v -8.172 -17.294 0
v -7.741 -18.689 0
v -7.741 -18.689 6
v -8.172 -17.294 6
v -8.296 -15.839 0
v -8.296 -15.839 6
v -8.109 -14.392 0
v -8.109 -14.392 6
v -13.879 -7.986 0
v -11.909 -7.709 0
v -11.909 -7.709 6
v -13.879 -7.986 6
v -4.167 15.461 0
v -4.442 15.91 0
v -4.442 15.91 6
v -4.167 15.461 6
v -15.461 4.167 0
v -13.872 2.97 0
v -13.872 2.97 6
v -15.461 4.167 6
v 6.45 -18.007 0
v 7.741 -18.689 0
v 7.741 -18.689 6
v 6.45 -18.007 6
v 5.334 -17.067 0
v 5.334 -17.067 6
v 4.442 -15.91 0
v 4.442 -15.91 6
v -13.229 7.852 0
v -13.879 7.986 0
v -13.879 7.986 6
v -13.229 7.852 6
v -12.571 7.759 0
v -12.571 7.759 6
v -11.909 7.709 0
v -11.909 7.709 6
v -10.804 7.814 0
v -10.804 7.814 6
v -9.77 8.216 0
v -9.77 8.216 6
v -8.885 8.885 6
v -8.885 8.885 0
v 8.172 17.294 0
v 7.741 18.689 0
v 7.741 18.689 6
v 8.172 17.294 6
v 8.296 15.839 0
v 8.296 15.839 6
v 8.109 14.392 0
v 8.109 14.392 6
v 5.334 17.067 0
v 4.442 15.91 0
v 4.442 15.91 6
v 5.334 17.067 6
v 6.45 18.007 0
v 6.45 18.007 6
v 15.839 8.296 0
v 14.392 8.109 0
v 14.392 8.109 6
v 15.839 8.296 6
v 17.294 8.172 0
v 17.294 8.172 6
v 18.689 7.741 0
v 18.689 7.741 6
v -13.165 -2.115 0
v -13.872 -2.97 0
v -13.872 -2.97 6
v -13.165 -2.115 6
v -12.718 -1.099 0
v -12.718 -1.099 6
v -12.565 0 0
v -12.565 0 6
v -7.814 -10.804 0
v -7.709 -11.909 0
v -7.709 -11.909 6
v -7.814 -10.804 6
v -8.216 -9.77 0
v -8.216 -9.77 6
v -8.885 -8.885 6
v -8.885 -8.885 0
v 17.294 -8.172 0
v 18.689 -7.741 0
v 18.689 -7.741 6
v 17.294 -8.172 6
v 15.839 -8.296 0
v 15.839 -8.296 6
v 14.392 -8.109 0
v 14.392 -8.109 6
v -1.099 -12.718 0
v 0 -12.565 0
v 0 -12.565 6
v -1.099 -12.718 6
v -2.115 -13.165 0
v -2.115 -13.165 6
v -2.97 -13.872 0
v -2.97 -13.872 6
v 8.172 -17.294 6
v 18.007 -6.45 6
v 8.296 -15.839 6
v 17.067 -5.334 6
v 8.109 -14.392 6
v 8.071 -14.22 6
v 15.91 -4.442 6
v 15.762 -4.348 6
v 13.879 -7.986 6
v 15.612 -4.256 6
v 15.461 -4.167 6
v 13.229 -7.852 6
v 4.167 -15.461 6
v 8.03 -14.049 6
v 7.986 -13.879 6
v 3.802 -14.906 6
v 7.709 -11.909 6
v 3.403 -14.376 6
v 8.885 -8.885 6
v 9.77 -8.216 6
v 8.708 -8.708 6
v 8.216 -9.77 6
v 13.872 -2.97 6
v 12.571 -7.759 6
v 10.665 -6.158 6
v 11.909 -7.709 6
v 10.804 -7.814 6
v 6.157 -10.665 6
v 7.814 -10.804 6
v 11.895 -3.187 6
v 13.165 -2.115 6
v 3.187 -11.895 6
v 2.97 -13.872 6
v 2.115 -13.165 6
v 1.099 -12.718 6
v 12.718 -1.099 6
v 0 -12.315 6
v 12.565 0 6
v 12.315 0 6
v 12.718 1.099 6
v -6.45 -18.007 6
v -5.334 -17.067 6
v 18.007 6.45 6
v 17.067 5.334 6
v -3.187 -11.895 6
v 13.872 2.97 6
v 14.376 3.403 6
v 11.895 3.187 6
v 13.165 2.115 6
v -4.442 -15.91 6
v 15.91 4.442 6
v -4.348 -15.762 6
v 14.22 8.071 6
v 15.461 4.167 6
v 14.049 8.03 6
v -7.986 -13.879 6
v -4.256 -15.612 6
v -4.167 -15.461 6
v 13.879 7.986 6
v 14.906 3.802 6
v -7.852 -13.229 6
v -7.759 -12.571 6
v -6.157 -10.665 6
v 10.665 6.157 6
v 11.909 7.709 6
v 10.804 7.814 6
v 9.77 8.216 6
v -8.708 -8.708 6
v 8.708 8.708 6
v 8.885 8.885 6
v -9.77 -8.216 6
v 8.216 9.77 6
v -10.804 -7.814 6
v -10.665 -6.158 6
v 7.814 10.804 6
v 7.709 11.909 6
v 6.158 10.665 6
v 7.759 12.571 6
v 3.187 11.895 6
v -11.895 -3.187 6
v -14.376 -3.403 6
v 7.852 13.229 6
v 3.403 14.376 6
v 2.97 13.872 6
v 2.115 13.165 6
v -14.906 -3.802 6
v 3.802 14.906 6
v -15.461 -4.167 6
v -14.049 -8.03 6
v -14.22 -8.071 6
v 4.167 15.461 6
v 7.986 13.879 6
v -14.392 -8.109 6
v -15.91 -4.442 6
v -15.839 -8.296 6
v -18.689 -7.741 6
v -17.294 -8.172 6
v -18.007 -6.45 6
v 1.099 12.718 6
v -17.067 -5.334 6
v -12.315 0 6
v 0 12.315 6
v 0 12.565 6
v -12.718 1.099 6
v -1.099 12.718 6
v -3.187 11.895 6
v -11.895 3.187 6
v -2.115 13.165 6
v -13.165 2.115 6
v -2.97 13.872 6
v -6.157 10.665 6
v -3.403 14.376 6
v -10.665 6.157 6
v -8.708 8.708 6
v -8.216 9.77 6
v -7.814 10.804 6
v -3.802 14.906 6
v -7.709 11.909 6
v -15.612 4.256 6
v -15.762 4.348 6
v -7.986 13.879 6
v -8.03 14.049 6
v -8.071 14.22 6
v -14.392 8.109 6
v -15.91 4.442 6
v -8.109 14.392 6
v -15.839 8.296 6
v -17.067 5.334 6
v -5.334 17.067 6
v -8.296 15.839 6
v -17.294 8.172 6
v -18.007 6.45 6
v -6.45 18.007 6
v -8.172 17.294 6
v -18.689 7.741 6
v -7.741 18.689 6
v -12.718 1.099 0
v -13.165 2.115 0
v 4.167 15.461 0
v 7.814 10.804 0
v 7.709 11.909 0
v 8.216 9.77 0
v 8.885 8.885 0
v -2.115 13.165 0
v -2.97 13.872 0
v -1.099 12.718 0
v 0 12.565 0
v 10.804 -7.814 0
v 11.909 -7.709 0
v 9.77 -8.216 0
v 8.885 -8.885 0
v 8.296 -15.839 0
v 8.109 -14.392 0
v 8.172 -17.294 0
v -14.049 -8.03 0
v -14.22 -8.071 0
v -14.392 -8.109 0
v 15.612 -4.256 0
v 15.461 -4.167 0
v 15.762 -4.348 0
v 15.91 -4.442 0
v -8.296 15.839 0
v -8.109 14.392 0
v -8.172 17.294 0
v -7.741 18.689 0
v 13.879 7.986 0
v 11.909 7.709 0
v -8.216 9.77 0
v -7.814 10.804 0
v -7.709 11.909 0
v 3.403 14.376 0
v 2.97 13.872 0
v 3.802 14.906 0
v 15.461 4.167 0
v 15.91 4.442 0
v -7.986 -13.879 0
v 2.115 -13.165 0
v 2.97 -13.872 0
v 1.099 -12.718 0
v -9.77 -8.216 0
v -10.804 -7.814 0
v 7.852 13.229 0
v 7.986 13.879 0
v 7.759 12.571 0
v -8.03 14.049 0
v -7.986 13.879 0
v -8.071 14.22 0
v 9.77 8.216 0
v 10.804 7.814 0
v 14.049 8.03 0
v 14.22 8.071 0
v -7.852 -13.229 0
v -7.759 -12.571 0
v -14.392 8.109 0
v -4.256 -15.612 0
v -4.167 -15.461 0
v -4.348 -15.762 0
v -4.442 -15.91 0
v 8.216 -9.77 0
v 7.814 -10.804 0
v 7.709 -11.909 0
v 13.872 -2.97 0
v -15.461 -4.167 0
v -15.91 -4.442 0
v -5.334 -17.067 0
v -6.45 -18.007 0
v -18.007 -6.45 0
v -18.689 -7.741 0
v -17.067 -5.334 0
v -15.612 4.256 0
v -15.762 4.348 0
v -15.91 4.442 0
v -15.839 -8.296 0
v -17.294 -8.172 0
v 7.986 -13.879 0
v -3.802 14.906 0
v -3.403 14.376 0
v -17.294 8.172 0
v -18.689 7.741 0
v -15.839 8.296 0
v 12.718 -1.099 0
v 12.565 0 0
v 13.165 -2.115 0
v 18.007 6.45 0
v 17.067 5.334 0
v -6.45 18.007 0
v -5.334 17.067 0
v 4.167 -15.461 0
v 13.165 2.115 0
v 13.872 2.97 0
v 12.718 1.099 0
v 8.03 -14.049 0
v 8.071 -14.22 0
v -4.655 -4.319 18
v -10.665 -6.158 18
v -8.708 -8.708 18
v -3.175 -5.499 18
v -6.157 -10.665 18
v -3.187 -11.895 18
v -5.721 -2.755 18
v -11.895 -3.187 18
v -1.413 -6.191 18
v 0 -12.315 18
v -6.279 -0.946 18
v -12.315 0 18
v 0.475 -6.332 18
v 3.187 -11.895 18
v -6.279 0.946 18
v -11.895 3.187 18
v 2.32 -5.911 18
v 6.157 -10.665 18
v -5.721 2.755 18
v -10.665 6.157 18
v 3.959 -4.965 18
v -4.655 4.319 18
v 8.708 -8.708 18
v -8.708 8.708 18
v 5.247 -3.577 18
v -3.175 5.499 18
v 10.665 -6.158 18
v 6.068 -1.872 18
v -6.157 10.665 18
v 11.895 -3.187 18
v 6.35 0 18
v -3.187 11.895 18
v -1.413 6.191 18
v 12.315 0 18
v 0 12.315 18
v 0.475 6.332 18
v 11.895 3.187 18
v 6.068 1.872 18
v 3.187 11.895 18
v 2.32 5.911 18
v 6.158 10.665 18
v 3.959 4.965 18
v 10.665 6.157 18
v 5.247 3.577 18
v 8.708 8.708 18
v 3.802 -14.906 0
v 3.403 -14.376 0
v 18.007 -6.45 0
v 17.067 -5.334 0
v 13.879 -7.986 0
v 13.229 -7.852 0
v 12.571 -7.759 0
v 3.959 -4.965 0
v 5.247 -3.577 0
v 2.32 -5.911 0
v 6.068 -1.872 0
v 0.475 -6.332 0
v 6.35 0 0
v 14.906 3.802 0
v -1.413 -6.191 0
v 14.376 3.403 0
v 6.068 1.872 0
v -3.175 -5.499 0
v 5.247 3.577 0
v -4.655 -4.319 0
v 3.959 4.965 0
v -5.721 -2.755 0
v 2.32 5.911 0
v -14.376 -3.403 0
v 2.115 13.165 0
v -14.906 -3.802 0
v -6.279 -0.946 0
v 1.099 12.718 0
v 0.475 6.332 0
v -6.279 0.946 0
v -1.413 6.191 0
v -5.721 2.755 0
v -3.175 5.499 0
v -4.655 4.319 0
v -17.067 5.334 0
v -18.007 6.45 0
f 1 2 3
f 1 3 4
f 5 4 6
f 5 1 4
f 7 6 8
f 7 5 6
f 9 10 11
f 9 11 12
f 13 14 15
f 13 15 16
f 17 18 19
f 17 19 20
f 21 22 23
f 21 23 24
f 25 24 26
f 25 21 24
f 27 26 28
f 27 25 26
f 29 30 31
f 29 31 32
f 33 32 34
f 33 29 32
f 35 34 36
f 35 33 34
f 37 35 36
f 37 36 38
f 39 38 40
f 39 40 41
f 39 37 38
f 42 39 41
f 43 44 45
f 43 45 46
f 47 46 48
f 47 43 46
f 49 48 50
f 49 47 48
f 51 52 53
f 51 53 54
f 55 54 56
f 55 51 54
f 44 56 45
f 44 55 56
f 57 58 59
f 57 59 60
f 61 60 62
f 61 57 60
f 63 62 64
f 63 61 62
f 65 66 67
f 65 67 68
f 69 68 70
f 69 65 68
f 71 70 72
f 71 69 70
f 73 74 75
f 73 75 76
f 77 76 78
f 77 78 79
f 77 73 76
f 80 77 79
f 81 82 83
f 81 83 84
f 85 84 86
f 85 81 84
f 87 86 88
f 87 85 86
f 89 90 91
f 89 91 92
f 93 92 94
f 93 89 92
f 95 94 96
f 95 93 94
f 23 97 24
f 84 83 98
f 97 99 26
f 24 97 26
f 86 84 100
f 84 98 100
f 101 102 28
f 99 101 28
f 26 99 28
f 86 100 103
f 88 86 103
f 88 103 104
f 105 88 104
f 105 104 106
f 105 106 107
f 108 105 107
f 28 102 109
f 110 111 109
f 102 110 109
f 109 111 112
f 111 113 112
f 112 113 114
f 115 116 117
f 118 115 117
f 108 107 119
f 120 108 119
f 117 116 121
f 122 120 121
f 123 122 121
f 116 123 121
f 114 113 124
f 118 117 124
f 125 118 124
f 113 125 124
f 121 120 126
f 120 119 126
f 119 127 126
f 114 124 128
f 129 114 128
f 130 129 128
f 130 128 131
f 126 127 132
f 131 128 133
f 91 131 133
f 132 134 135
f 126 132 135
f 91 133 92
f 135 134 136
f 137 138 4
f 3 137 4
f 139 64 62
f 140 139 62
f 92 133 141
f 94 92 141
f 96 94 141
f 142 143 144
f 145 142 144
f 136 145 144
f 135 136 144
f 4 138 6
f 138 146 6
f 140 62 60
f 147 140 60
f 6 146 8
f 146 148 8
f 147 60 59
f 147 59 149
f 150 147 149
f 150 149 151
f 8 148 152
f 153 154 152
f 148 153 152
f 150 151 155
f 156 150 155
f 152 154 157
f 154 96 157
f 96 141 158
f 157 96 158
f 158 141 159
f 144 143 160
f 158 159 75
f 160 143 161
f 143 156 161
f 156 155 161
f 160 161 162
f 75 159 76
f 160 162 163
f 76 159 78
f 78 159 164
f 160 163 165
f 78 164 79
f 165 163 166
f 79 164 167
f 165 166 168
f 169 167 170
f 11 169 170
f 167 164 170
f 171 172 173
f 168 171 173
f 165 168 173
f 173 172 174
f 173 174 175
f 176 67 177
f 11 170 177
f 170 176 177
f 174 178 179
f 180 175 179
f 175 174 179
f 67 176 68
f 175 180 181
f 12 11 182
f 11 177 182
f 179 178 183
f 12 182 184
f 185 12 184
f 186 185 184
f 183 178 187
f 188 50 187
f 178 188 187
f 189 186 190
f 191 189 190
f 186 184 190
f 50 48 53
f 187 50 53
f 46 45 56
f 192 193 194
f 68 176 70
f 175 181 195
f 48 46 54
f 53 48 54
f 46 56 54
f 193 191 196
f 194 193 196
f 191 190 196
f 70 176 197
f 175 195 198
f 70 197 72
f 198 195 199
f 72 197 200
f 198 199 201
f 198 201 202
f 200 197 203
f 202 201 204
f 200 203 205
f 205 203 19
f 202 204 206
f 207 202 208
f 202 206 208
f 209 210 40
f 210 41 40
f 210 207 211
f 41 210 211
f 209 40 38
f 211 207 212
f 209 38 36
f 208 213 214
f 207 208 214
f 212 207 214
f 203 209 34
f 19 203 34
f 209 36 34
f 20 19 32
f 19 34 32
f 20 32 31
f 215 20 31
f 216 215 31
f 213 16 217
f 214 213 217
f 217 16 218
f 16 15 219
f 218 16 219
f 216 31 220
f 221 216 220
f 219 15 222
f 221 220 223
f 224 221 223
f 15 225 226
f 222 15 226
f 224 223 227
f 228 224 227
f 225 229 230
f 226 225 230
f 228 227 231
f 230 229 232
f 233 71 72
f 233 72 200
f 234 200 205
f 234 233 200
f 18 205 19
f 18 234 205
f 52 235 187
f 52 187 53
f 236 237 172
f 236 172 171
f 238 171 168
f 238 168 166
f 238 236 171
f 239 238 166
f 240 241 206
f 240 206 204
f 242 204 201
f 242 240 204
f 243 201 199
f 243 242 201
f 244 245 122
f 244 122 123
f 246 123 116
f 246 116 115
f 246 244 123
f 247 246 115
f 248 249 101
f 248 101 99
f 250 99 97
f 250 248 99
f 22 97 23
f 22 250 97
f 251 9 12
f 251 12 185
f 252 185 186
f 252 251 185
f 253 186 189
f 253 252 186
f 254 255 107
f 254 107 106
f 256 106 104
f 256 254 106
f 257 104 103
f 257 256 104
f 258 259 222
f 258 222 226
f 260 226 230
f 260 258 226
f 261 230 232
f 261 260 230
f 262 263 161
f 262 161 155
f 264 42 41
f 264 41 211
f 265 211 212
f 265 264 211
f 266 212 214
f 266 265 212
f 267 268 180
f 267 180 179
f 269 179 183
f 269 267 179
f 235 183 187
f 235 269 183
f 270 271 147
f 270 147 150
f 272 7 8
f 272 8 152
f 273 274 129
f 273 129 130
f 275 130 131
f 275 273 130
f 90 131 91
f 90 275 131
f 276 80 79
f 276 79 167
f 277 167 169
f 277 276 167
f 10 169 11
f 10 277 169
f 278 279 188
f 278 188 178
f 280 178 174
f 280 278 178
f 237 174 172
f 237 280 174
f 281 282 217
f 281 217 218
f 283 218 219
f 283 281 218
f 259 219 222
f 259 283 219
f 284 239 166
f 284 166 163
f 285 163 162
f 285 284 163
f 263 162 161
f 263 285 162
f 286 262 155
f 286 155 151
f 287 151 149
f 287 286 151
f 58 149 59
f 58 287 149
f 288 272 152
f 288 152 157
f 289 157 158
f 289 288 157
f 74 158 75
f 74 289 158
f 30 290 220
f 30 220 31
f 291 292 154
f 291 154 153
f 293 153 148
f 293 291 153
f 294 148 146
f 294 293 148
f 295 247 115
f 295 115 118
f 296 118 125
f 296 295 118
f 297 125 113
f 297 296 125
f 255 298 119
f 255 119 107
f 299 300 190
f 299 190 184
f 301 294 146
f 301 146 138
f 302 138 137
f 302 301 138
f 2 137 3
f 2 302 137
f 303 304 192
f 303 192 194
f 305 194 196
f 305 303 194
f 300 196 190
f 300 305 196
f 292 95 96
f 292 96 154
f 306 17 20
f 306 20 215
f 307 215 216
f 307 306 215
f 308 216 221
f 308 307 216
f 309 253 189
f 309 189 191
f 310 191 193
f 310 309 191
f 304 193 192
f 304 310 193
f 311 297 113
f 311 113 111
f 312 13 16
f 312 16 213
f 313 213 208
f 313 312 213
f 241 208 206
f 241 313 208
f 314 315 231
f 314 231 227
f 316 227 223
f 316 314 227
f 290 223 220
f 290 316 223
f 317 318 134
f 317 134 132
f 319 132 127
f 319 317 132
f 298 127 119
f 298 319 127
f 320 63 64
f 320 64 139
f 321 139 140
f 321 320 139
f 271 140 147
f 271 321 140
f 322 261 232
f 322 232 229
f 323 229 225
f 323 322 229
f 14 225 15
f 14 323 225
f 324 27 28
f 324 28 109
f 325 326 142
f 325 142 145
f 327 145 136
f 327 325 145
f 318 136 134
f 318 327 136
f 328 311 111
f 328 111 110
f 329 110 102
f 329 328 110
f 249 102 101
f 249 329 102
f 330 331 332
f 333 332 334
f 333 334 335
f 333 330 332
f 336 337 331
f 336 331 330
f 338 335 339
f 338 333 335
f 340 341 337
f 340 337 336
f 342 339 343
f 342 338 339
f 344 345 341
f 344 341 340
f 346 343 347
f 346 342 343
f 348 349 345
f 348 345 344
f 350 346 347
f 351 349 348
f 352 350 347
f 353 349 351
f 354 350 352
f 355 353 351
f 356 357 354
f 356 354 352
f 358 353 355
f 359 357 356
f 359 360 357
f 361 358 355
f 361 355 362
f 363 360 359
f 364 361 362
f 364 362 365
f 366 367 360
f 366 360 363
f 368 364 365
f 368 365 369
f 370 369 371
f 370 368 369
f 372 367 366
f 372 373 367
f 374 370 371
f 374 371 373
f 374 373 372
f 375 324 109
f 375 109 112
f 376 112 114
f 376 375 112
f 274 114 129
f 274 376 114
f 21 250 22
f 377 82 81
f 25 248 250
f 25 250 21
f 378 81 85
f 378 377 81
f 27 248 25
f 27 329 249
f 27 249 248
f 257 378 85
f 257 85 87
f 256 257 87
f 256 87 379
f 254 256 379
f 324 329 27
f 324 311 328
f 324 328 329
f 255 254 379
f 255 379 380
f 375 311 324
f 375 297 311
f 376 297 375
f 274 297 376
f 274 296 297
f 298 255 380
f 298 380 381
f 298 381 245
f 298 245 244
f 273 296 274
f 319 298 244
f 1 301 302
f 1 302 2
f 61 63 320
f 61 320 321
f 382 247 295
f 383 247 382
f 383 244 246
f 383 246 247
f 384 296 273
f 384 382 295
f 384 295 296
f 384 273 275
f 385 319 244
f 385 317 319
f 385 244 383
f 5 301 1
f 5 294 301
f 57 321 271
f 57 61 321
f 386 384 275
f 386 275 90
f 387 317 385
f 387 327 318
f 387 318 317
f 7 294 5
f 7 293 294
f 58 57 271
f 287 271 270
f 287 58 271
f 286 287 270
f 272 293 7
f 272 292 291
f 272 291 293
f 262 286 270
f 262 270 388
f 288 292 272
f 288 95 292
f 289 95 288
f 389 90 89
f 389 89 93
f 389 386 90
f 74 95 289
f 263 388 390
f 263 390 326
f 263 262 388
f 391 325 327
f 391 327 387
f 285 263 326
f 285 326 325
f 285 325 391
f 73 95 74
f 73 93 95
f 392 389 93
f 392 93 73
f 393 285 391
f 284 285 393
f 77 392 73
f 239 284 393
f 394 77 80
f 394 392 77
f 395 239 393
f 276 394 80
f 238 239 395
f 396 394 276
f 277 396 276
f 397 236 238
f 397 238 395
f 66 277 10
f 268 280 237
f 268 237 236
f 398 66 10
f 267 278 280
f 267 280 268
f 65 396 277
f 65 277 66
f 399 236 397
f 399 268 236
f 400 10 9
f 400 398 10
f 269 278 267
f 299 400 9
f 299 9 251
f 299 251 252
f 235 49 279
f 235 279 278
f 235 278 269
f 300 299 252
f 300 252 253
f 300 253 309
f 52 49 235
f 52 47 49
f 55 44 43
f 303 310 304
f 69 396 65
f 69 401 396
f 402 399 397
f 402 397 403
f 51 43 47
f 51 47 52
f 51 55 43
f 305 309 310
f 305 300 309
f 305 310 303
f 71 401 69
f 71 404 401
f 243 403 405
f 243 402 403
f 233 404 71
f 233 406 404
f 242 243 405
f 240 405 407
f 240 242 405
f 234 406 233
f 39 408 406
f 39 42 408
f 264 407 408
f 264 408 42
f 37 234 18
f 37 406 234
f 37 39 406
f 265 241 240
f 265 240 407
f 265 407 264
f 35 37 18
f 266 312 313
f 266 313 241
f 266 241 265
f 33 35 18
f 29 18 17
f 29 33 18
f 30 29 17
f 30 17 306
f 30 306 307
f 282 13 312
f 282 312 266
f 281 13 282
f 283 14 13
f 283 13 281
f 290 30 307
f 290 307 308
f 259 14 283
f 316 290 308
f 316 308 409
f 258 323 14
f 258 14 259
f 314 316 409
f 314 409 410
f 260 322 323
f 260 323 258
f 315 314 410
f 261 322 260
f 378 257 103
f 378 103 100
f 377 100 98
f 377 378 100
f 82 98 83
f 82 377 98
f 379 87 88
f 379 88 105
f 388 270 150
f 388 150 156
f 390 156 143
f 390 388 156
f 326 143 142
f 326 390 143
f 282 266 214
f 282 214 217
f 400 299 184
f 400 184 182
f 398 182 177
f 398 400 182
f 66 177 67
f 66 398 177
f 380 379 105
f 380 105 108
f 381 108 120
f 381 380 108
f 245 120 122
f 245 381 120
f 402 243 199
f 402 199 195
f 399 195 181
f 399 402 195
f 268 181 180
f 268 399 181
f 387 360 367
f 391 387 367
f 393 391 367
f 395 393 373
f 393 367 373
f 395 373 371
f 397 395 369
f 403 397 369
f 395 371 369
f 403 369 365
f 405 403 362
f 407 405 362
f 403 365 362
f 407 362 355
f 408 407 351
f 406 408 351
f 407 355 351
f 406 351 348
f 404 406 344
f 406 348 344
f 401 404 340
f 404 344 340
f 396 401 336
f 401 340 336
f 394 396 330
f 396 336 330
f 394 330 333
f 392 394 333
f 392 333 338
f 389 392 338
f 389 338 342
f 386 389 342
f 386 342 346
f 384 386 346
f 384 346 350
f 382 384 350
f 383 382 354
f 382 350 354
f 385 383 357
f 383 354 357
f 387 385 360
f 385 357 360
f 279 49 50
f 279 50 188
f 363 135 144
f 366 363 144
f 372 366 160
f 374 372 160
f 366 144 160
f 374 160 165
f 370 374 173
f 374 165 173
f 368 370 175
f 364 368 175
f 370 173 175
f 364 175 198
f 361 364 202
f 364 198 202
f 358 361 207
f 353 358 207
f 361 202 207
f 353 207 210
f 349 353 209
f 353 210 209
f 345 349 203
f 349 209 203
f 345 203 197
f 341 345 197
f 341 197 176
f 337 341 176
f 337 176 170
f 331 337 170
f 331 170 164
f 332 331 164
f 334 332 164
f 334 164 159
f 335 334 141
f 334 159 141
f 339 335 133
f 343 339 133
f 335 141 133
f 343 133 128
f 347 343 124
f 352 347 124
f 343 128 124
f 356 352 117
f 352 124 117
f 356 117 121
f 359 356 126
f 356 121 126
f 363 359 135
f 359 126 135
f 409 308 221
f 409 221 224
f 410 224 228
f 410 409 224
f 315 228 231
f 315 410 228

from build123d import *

# Parameters (mm, degrees)
PAD_DEPTH    = 6
SKETCH_R     = 12.315
PAD001_DEPTH = 12
SKETCH001_R  = 6.35
POCKET_DEPTH = 18


with BuildPart() as part:
    # Sprocket → Pad (new body)
    with BuildSketch(Plane.XY):
        with BuildLine():
            ThreePointArc((-7.741217, 18.688951), (-5.866931, 17.566734), (-4.442485, 15.910452))
            Line((-4.442485, 15.910452), (-4.167177, 15.46119))
            ThreePointArc((-4.167177, 15.46119), (-3.606611, 14.637889), (-2.969716, 13.872106))
            ThreePointArc((-2.969716, 13.872106), (-1.622244, 12.906521), (0, 12.5654))
            ThreePointArc((0, 12.5654), (1.622244, 12.906521), (2.969716, 13.872106))
            ThreePointArc((2.969716, 13.872106), (3.606611, 14.637889), (4.167177, 15.46119))
            Line((4.167177, 15.46119), (4.442485, 15.910452))
            ThreePointArc((4.442485, 15.910452), (5.866931, 17.566734), (7.741217, 18.688951))
            ThreePointArc((7.741217, 18.688951), (8.27301, 16.570104), (8.109077, 14.391699))
            Line((8.109077, 14.391699), (7.986073, 13.879351))
            ThreePointArc((7.986073, 13.879351), (7.800291, 12.90081), (7.709154, 11.908967))
            ThreePointArc((7.709154, 11.908967), (7.979189, 10.273388), (8.885079, 8.885079))
            ThreePointArc((8.885079, 8.885079), (10.273388, 7.979189), (11.908967, 7.709154))
            Line((11.908967, 7.709154), (13.879351, 7.986073))
            ThreePointArc((13.879351, 7.986073), (14.134744, 8.050827), (14.391699, 8.109077))
            ThreePointArc((14.391699, 8.109077), (16.570104, 8.27301), (18.688951, 7.741217))
            ThreePointArc((18.688951, 7.741217), (17.566734, 5.866931), (15.910452, 4.442485))
            Line((15.910452, 4.442485), (15.46119, 4.167177))
            ThreePointArc((15.46119, 4.167177), (14.637889, 3.606611), (13.872106, 2.969716))
            ThreePointArc((13.872106, 2.969716), (12.906521, 1.622244), (12.5654, 0))
            ThreePointArc((12.5654, 0), (12.906521, -1.622244), (13.872106, -2.969716))
            Line((13.872106, -2.969716), (15.46119, -4.167177))
            ThreePointArc((15.46119, -4.167177), (15.687568, -4.30198), (15.910452, -4.442485))
            ThreePointArc((15.910452, -4.442485), (17.566734, -5.866931), (18.688951, -7.741217))
            ThreePointArc((18.688951, -7.741217), (16.570104, -8.27301), (14.391699, -8.109077))
            Line((14.391699, -8.109077), (13.879351, -7.986073))
            ThreePointArc((13.879351, -7.986073), (12.90081, -7.800291), (11.908967, -7.709154))
            ThreePointArc((11.908967, -7.709154), (10.273388, -7.979189), (8.885079, -8.885079))
            ThreePointArc((8.885079, -8.885079), (7.979189, -10.273388), (7.709154, -11.908967))
            Line((7.709154, -11.908967), (7.986073, -13.879351))
            ThreePointArc((7.986073, -13.879351), (8.050827, -14.134744), (8.109077, -14.391699))
            ThreePointArc((8.109077, -14.391699), (8.27301, -16.570104), (7.741217, -18.688951))
            ThreePointArc((7.741217, -18.688951), (5.866931, -17.566734), (4.442485, -15.910452))
            Line((4.442485, -15.910452), (4.167177, -15.46119))
            ThreePointArc((4.167177, -15.46119), (3.606611, -14.637889), (2.969716, -13.872106))
            ThreePointArc((2.969716, -13.872106), (1.622244, -12.906521), (0, -12.5654))
            ThreePointArc((0, -12.5654), (-1.622244, -12.906521), (-2.969716, -13.872106))
            Line((-2.969716, -13.872106), (-4.167177, -15.46119))
            ThreePointArc((-4.167177, -15.46119), (-4.30198, -15.687568), (-4.442485, -15.910452))
            ThreePointArc((-4.442485, -15.910452), (-5.866931, -17.566734), (-7.741217, -18.688951))
            ThreePointArc((-7.741217, -18.688951), (-8.27301, -16.570104), (-8.109077, -14.391699))
            Line((-8.109077, -14.391699), (-7.986073, -13.879351))
            ThreePointArc((-7.986073, -13.879351), (-7.800291, -12.90081), (-7.709154, -11.908967))
            ThreePointArc((-7.709154, -11.908967), (-7.979189, -10.273388), (-8.885079, -8.885079))
            ThreePointArc((-8.885079, -8.885079), (-10.273388, -7.979189), (-11.908967, -7.709154))
            Line((-11.908967, -7.709154), (-13.879351, -7.986073))
            ThreePointArc((-13.879351, -7.986073), (-14.134744, -8.050827), (-14.391699, -8.109077))
            ThreePointArc((-14.391699, -8.109077), (-16.570104, -8.27301), (-18.688951, -7.741217))
            ThreePointArc((-18.688951, -7.741217), (-17.566734, -5.866931), (-15.910452, -4.442485))
            Line((-15.910452, -4.442485), (-15.46119, -4.167177))
            ThreePointArc((-15.46119, -4.167177), (-14.637889, -3.606611), (-13.872106, -2.969716))
            ThreePointArc((-13.872106, -2.969716), (-12.906521, -1.622244), (-12.5654, 0))
            ThreePointArc((-12.5654, 0), (-12.906521, 1.622244), (-13.872106, 2.969716))
            Line((-13.872106, 2.969716), (-15.46119, 4.167177))
            ThreePointArc((-15.46119, 4.167177), (-15.687568, 4.30198), (-15.910452, 4.442485))
            ThreePointArc((-15.910452, 4.442485), (-17.566734, 5.866931), (-18.688951, 7.741217))
            ThreePointArc((-18.688951, 7.741217), (-16.570104, 8.27301), (-14.391699, 8.109077))
            Line((-14.391699, 8.109077), (-13.879351, 7.986073))
            ThreePointArc((-13.879351, 7.986073), (-12.90081, 7.800291), (-11.908967, 7.709154))
            ThreePointArc((-11.908967, 7.709154), (-10.273388, 7.979189), (-8.885079, 8.885079))
            ThreePointArc((-8.885079, 8.885079), (-7.979189, 10.273388), (-7.709154, 11.908967))
            Line((-7.709154, 11.908967), (-7.986073, 13.879351))
            ThreePointArc((-7.986073, 13.879351), (-8.050827, 14.134744), (-8.109077, 14.391699))
            ThreePointArc((-8.109077, 14.391699), (-8.27301, 16.570104), (-7.741217, 18.688951))
        make_face()
    extrude(amount=PAD_DEPTH)

    # Sketch (on Face50 of Pad) → Pad001 (join)
    with BuildSketch(Plane.XY.offset(6)):
        Circle(SKETCH_R)
    extrude(amount=PAD001_DEPTH)

    # Sketch001 (on Face60 of Pad001) → Pocket (cut)
    with BuildSketch(Plane.XY.offset(18)):
        Circle(SKETCH001_R)
    extrude(amount=-POCKET_DEPTH, mode=Mode.SUBTRACT)


solid = part.part
